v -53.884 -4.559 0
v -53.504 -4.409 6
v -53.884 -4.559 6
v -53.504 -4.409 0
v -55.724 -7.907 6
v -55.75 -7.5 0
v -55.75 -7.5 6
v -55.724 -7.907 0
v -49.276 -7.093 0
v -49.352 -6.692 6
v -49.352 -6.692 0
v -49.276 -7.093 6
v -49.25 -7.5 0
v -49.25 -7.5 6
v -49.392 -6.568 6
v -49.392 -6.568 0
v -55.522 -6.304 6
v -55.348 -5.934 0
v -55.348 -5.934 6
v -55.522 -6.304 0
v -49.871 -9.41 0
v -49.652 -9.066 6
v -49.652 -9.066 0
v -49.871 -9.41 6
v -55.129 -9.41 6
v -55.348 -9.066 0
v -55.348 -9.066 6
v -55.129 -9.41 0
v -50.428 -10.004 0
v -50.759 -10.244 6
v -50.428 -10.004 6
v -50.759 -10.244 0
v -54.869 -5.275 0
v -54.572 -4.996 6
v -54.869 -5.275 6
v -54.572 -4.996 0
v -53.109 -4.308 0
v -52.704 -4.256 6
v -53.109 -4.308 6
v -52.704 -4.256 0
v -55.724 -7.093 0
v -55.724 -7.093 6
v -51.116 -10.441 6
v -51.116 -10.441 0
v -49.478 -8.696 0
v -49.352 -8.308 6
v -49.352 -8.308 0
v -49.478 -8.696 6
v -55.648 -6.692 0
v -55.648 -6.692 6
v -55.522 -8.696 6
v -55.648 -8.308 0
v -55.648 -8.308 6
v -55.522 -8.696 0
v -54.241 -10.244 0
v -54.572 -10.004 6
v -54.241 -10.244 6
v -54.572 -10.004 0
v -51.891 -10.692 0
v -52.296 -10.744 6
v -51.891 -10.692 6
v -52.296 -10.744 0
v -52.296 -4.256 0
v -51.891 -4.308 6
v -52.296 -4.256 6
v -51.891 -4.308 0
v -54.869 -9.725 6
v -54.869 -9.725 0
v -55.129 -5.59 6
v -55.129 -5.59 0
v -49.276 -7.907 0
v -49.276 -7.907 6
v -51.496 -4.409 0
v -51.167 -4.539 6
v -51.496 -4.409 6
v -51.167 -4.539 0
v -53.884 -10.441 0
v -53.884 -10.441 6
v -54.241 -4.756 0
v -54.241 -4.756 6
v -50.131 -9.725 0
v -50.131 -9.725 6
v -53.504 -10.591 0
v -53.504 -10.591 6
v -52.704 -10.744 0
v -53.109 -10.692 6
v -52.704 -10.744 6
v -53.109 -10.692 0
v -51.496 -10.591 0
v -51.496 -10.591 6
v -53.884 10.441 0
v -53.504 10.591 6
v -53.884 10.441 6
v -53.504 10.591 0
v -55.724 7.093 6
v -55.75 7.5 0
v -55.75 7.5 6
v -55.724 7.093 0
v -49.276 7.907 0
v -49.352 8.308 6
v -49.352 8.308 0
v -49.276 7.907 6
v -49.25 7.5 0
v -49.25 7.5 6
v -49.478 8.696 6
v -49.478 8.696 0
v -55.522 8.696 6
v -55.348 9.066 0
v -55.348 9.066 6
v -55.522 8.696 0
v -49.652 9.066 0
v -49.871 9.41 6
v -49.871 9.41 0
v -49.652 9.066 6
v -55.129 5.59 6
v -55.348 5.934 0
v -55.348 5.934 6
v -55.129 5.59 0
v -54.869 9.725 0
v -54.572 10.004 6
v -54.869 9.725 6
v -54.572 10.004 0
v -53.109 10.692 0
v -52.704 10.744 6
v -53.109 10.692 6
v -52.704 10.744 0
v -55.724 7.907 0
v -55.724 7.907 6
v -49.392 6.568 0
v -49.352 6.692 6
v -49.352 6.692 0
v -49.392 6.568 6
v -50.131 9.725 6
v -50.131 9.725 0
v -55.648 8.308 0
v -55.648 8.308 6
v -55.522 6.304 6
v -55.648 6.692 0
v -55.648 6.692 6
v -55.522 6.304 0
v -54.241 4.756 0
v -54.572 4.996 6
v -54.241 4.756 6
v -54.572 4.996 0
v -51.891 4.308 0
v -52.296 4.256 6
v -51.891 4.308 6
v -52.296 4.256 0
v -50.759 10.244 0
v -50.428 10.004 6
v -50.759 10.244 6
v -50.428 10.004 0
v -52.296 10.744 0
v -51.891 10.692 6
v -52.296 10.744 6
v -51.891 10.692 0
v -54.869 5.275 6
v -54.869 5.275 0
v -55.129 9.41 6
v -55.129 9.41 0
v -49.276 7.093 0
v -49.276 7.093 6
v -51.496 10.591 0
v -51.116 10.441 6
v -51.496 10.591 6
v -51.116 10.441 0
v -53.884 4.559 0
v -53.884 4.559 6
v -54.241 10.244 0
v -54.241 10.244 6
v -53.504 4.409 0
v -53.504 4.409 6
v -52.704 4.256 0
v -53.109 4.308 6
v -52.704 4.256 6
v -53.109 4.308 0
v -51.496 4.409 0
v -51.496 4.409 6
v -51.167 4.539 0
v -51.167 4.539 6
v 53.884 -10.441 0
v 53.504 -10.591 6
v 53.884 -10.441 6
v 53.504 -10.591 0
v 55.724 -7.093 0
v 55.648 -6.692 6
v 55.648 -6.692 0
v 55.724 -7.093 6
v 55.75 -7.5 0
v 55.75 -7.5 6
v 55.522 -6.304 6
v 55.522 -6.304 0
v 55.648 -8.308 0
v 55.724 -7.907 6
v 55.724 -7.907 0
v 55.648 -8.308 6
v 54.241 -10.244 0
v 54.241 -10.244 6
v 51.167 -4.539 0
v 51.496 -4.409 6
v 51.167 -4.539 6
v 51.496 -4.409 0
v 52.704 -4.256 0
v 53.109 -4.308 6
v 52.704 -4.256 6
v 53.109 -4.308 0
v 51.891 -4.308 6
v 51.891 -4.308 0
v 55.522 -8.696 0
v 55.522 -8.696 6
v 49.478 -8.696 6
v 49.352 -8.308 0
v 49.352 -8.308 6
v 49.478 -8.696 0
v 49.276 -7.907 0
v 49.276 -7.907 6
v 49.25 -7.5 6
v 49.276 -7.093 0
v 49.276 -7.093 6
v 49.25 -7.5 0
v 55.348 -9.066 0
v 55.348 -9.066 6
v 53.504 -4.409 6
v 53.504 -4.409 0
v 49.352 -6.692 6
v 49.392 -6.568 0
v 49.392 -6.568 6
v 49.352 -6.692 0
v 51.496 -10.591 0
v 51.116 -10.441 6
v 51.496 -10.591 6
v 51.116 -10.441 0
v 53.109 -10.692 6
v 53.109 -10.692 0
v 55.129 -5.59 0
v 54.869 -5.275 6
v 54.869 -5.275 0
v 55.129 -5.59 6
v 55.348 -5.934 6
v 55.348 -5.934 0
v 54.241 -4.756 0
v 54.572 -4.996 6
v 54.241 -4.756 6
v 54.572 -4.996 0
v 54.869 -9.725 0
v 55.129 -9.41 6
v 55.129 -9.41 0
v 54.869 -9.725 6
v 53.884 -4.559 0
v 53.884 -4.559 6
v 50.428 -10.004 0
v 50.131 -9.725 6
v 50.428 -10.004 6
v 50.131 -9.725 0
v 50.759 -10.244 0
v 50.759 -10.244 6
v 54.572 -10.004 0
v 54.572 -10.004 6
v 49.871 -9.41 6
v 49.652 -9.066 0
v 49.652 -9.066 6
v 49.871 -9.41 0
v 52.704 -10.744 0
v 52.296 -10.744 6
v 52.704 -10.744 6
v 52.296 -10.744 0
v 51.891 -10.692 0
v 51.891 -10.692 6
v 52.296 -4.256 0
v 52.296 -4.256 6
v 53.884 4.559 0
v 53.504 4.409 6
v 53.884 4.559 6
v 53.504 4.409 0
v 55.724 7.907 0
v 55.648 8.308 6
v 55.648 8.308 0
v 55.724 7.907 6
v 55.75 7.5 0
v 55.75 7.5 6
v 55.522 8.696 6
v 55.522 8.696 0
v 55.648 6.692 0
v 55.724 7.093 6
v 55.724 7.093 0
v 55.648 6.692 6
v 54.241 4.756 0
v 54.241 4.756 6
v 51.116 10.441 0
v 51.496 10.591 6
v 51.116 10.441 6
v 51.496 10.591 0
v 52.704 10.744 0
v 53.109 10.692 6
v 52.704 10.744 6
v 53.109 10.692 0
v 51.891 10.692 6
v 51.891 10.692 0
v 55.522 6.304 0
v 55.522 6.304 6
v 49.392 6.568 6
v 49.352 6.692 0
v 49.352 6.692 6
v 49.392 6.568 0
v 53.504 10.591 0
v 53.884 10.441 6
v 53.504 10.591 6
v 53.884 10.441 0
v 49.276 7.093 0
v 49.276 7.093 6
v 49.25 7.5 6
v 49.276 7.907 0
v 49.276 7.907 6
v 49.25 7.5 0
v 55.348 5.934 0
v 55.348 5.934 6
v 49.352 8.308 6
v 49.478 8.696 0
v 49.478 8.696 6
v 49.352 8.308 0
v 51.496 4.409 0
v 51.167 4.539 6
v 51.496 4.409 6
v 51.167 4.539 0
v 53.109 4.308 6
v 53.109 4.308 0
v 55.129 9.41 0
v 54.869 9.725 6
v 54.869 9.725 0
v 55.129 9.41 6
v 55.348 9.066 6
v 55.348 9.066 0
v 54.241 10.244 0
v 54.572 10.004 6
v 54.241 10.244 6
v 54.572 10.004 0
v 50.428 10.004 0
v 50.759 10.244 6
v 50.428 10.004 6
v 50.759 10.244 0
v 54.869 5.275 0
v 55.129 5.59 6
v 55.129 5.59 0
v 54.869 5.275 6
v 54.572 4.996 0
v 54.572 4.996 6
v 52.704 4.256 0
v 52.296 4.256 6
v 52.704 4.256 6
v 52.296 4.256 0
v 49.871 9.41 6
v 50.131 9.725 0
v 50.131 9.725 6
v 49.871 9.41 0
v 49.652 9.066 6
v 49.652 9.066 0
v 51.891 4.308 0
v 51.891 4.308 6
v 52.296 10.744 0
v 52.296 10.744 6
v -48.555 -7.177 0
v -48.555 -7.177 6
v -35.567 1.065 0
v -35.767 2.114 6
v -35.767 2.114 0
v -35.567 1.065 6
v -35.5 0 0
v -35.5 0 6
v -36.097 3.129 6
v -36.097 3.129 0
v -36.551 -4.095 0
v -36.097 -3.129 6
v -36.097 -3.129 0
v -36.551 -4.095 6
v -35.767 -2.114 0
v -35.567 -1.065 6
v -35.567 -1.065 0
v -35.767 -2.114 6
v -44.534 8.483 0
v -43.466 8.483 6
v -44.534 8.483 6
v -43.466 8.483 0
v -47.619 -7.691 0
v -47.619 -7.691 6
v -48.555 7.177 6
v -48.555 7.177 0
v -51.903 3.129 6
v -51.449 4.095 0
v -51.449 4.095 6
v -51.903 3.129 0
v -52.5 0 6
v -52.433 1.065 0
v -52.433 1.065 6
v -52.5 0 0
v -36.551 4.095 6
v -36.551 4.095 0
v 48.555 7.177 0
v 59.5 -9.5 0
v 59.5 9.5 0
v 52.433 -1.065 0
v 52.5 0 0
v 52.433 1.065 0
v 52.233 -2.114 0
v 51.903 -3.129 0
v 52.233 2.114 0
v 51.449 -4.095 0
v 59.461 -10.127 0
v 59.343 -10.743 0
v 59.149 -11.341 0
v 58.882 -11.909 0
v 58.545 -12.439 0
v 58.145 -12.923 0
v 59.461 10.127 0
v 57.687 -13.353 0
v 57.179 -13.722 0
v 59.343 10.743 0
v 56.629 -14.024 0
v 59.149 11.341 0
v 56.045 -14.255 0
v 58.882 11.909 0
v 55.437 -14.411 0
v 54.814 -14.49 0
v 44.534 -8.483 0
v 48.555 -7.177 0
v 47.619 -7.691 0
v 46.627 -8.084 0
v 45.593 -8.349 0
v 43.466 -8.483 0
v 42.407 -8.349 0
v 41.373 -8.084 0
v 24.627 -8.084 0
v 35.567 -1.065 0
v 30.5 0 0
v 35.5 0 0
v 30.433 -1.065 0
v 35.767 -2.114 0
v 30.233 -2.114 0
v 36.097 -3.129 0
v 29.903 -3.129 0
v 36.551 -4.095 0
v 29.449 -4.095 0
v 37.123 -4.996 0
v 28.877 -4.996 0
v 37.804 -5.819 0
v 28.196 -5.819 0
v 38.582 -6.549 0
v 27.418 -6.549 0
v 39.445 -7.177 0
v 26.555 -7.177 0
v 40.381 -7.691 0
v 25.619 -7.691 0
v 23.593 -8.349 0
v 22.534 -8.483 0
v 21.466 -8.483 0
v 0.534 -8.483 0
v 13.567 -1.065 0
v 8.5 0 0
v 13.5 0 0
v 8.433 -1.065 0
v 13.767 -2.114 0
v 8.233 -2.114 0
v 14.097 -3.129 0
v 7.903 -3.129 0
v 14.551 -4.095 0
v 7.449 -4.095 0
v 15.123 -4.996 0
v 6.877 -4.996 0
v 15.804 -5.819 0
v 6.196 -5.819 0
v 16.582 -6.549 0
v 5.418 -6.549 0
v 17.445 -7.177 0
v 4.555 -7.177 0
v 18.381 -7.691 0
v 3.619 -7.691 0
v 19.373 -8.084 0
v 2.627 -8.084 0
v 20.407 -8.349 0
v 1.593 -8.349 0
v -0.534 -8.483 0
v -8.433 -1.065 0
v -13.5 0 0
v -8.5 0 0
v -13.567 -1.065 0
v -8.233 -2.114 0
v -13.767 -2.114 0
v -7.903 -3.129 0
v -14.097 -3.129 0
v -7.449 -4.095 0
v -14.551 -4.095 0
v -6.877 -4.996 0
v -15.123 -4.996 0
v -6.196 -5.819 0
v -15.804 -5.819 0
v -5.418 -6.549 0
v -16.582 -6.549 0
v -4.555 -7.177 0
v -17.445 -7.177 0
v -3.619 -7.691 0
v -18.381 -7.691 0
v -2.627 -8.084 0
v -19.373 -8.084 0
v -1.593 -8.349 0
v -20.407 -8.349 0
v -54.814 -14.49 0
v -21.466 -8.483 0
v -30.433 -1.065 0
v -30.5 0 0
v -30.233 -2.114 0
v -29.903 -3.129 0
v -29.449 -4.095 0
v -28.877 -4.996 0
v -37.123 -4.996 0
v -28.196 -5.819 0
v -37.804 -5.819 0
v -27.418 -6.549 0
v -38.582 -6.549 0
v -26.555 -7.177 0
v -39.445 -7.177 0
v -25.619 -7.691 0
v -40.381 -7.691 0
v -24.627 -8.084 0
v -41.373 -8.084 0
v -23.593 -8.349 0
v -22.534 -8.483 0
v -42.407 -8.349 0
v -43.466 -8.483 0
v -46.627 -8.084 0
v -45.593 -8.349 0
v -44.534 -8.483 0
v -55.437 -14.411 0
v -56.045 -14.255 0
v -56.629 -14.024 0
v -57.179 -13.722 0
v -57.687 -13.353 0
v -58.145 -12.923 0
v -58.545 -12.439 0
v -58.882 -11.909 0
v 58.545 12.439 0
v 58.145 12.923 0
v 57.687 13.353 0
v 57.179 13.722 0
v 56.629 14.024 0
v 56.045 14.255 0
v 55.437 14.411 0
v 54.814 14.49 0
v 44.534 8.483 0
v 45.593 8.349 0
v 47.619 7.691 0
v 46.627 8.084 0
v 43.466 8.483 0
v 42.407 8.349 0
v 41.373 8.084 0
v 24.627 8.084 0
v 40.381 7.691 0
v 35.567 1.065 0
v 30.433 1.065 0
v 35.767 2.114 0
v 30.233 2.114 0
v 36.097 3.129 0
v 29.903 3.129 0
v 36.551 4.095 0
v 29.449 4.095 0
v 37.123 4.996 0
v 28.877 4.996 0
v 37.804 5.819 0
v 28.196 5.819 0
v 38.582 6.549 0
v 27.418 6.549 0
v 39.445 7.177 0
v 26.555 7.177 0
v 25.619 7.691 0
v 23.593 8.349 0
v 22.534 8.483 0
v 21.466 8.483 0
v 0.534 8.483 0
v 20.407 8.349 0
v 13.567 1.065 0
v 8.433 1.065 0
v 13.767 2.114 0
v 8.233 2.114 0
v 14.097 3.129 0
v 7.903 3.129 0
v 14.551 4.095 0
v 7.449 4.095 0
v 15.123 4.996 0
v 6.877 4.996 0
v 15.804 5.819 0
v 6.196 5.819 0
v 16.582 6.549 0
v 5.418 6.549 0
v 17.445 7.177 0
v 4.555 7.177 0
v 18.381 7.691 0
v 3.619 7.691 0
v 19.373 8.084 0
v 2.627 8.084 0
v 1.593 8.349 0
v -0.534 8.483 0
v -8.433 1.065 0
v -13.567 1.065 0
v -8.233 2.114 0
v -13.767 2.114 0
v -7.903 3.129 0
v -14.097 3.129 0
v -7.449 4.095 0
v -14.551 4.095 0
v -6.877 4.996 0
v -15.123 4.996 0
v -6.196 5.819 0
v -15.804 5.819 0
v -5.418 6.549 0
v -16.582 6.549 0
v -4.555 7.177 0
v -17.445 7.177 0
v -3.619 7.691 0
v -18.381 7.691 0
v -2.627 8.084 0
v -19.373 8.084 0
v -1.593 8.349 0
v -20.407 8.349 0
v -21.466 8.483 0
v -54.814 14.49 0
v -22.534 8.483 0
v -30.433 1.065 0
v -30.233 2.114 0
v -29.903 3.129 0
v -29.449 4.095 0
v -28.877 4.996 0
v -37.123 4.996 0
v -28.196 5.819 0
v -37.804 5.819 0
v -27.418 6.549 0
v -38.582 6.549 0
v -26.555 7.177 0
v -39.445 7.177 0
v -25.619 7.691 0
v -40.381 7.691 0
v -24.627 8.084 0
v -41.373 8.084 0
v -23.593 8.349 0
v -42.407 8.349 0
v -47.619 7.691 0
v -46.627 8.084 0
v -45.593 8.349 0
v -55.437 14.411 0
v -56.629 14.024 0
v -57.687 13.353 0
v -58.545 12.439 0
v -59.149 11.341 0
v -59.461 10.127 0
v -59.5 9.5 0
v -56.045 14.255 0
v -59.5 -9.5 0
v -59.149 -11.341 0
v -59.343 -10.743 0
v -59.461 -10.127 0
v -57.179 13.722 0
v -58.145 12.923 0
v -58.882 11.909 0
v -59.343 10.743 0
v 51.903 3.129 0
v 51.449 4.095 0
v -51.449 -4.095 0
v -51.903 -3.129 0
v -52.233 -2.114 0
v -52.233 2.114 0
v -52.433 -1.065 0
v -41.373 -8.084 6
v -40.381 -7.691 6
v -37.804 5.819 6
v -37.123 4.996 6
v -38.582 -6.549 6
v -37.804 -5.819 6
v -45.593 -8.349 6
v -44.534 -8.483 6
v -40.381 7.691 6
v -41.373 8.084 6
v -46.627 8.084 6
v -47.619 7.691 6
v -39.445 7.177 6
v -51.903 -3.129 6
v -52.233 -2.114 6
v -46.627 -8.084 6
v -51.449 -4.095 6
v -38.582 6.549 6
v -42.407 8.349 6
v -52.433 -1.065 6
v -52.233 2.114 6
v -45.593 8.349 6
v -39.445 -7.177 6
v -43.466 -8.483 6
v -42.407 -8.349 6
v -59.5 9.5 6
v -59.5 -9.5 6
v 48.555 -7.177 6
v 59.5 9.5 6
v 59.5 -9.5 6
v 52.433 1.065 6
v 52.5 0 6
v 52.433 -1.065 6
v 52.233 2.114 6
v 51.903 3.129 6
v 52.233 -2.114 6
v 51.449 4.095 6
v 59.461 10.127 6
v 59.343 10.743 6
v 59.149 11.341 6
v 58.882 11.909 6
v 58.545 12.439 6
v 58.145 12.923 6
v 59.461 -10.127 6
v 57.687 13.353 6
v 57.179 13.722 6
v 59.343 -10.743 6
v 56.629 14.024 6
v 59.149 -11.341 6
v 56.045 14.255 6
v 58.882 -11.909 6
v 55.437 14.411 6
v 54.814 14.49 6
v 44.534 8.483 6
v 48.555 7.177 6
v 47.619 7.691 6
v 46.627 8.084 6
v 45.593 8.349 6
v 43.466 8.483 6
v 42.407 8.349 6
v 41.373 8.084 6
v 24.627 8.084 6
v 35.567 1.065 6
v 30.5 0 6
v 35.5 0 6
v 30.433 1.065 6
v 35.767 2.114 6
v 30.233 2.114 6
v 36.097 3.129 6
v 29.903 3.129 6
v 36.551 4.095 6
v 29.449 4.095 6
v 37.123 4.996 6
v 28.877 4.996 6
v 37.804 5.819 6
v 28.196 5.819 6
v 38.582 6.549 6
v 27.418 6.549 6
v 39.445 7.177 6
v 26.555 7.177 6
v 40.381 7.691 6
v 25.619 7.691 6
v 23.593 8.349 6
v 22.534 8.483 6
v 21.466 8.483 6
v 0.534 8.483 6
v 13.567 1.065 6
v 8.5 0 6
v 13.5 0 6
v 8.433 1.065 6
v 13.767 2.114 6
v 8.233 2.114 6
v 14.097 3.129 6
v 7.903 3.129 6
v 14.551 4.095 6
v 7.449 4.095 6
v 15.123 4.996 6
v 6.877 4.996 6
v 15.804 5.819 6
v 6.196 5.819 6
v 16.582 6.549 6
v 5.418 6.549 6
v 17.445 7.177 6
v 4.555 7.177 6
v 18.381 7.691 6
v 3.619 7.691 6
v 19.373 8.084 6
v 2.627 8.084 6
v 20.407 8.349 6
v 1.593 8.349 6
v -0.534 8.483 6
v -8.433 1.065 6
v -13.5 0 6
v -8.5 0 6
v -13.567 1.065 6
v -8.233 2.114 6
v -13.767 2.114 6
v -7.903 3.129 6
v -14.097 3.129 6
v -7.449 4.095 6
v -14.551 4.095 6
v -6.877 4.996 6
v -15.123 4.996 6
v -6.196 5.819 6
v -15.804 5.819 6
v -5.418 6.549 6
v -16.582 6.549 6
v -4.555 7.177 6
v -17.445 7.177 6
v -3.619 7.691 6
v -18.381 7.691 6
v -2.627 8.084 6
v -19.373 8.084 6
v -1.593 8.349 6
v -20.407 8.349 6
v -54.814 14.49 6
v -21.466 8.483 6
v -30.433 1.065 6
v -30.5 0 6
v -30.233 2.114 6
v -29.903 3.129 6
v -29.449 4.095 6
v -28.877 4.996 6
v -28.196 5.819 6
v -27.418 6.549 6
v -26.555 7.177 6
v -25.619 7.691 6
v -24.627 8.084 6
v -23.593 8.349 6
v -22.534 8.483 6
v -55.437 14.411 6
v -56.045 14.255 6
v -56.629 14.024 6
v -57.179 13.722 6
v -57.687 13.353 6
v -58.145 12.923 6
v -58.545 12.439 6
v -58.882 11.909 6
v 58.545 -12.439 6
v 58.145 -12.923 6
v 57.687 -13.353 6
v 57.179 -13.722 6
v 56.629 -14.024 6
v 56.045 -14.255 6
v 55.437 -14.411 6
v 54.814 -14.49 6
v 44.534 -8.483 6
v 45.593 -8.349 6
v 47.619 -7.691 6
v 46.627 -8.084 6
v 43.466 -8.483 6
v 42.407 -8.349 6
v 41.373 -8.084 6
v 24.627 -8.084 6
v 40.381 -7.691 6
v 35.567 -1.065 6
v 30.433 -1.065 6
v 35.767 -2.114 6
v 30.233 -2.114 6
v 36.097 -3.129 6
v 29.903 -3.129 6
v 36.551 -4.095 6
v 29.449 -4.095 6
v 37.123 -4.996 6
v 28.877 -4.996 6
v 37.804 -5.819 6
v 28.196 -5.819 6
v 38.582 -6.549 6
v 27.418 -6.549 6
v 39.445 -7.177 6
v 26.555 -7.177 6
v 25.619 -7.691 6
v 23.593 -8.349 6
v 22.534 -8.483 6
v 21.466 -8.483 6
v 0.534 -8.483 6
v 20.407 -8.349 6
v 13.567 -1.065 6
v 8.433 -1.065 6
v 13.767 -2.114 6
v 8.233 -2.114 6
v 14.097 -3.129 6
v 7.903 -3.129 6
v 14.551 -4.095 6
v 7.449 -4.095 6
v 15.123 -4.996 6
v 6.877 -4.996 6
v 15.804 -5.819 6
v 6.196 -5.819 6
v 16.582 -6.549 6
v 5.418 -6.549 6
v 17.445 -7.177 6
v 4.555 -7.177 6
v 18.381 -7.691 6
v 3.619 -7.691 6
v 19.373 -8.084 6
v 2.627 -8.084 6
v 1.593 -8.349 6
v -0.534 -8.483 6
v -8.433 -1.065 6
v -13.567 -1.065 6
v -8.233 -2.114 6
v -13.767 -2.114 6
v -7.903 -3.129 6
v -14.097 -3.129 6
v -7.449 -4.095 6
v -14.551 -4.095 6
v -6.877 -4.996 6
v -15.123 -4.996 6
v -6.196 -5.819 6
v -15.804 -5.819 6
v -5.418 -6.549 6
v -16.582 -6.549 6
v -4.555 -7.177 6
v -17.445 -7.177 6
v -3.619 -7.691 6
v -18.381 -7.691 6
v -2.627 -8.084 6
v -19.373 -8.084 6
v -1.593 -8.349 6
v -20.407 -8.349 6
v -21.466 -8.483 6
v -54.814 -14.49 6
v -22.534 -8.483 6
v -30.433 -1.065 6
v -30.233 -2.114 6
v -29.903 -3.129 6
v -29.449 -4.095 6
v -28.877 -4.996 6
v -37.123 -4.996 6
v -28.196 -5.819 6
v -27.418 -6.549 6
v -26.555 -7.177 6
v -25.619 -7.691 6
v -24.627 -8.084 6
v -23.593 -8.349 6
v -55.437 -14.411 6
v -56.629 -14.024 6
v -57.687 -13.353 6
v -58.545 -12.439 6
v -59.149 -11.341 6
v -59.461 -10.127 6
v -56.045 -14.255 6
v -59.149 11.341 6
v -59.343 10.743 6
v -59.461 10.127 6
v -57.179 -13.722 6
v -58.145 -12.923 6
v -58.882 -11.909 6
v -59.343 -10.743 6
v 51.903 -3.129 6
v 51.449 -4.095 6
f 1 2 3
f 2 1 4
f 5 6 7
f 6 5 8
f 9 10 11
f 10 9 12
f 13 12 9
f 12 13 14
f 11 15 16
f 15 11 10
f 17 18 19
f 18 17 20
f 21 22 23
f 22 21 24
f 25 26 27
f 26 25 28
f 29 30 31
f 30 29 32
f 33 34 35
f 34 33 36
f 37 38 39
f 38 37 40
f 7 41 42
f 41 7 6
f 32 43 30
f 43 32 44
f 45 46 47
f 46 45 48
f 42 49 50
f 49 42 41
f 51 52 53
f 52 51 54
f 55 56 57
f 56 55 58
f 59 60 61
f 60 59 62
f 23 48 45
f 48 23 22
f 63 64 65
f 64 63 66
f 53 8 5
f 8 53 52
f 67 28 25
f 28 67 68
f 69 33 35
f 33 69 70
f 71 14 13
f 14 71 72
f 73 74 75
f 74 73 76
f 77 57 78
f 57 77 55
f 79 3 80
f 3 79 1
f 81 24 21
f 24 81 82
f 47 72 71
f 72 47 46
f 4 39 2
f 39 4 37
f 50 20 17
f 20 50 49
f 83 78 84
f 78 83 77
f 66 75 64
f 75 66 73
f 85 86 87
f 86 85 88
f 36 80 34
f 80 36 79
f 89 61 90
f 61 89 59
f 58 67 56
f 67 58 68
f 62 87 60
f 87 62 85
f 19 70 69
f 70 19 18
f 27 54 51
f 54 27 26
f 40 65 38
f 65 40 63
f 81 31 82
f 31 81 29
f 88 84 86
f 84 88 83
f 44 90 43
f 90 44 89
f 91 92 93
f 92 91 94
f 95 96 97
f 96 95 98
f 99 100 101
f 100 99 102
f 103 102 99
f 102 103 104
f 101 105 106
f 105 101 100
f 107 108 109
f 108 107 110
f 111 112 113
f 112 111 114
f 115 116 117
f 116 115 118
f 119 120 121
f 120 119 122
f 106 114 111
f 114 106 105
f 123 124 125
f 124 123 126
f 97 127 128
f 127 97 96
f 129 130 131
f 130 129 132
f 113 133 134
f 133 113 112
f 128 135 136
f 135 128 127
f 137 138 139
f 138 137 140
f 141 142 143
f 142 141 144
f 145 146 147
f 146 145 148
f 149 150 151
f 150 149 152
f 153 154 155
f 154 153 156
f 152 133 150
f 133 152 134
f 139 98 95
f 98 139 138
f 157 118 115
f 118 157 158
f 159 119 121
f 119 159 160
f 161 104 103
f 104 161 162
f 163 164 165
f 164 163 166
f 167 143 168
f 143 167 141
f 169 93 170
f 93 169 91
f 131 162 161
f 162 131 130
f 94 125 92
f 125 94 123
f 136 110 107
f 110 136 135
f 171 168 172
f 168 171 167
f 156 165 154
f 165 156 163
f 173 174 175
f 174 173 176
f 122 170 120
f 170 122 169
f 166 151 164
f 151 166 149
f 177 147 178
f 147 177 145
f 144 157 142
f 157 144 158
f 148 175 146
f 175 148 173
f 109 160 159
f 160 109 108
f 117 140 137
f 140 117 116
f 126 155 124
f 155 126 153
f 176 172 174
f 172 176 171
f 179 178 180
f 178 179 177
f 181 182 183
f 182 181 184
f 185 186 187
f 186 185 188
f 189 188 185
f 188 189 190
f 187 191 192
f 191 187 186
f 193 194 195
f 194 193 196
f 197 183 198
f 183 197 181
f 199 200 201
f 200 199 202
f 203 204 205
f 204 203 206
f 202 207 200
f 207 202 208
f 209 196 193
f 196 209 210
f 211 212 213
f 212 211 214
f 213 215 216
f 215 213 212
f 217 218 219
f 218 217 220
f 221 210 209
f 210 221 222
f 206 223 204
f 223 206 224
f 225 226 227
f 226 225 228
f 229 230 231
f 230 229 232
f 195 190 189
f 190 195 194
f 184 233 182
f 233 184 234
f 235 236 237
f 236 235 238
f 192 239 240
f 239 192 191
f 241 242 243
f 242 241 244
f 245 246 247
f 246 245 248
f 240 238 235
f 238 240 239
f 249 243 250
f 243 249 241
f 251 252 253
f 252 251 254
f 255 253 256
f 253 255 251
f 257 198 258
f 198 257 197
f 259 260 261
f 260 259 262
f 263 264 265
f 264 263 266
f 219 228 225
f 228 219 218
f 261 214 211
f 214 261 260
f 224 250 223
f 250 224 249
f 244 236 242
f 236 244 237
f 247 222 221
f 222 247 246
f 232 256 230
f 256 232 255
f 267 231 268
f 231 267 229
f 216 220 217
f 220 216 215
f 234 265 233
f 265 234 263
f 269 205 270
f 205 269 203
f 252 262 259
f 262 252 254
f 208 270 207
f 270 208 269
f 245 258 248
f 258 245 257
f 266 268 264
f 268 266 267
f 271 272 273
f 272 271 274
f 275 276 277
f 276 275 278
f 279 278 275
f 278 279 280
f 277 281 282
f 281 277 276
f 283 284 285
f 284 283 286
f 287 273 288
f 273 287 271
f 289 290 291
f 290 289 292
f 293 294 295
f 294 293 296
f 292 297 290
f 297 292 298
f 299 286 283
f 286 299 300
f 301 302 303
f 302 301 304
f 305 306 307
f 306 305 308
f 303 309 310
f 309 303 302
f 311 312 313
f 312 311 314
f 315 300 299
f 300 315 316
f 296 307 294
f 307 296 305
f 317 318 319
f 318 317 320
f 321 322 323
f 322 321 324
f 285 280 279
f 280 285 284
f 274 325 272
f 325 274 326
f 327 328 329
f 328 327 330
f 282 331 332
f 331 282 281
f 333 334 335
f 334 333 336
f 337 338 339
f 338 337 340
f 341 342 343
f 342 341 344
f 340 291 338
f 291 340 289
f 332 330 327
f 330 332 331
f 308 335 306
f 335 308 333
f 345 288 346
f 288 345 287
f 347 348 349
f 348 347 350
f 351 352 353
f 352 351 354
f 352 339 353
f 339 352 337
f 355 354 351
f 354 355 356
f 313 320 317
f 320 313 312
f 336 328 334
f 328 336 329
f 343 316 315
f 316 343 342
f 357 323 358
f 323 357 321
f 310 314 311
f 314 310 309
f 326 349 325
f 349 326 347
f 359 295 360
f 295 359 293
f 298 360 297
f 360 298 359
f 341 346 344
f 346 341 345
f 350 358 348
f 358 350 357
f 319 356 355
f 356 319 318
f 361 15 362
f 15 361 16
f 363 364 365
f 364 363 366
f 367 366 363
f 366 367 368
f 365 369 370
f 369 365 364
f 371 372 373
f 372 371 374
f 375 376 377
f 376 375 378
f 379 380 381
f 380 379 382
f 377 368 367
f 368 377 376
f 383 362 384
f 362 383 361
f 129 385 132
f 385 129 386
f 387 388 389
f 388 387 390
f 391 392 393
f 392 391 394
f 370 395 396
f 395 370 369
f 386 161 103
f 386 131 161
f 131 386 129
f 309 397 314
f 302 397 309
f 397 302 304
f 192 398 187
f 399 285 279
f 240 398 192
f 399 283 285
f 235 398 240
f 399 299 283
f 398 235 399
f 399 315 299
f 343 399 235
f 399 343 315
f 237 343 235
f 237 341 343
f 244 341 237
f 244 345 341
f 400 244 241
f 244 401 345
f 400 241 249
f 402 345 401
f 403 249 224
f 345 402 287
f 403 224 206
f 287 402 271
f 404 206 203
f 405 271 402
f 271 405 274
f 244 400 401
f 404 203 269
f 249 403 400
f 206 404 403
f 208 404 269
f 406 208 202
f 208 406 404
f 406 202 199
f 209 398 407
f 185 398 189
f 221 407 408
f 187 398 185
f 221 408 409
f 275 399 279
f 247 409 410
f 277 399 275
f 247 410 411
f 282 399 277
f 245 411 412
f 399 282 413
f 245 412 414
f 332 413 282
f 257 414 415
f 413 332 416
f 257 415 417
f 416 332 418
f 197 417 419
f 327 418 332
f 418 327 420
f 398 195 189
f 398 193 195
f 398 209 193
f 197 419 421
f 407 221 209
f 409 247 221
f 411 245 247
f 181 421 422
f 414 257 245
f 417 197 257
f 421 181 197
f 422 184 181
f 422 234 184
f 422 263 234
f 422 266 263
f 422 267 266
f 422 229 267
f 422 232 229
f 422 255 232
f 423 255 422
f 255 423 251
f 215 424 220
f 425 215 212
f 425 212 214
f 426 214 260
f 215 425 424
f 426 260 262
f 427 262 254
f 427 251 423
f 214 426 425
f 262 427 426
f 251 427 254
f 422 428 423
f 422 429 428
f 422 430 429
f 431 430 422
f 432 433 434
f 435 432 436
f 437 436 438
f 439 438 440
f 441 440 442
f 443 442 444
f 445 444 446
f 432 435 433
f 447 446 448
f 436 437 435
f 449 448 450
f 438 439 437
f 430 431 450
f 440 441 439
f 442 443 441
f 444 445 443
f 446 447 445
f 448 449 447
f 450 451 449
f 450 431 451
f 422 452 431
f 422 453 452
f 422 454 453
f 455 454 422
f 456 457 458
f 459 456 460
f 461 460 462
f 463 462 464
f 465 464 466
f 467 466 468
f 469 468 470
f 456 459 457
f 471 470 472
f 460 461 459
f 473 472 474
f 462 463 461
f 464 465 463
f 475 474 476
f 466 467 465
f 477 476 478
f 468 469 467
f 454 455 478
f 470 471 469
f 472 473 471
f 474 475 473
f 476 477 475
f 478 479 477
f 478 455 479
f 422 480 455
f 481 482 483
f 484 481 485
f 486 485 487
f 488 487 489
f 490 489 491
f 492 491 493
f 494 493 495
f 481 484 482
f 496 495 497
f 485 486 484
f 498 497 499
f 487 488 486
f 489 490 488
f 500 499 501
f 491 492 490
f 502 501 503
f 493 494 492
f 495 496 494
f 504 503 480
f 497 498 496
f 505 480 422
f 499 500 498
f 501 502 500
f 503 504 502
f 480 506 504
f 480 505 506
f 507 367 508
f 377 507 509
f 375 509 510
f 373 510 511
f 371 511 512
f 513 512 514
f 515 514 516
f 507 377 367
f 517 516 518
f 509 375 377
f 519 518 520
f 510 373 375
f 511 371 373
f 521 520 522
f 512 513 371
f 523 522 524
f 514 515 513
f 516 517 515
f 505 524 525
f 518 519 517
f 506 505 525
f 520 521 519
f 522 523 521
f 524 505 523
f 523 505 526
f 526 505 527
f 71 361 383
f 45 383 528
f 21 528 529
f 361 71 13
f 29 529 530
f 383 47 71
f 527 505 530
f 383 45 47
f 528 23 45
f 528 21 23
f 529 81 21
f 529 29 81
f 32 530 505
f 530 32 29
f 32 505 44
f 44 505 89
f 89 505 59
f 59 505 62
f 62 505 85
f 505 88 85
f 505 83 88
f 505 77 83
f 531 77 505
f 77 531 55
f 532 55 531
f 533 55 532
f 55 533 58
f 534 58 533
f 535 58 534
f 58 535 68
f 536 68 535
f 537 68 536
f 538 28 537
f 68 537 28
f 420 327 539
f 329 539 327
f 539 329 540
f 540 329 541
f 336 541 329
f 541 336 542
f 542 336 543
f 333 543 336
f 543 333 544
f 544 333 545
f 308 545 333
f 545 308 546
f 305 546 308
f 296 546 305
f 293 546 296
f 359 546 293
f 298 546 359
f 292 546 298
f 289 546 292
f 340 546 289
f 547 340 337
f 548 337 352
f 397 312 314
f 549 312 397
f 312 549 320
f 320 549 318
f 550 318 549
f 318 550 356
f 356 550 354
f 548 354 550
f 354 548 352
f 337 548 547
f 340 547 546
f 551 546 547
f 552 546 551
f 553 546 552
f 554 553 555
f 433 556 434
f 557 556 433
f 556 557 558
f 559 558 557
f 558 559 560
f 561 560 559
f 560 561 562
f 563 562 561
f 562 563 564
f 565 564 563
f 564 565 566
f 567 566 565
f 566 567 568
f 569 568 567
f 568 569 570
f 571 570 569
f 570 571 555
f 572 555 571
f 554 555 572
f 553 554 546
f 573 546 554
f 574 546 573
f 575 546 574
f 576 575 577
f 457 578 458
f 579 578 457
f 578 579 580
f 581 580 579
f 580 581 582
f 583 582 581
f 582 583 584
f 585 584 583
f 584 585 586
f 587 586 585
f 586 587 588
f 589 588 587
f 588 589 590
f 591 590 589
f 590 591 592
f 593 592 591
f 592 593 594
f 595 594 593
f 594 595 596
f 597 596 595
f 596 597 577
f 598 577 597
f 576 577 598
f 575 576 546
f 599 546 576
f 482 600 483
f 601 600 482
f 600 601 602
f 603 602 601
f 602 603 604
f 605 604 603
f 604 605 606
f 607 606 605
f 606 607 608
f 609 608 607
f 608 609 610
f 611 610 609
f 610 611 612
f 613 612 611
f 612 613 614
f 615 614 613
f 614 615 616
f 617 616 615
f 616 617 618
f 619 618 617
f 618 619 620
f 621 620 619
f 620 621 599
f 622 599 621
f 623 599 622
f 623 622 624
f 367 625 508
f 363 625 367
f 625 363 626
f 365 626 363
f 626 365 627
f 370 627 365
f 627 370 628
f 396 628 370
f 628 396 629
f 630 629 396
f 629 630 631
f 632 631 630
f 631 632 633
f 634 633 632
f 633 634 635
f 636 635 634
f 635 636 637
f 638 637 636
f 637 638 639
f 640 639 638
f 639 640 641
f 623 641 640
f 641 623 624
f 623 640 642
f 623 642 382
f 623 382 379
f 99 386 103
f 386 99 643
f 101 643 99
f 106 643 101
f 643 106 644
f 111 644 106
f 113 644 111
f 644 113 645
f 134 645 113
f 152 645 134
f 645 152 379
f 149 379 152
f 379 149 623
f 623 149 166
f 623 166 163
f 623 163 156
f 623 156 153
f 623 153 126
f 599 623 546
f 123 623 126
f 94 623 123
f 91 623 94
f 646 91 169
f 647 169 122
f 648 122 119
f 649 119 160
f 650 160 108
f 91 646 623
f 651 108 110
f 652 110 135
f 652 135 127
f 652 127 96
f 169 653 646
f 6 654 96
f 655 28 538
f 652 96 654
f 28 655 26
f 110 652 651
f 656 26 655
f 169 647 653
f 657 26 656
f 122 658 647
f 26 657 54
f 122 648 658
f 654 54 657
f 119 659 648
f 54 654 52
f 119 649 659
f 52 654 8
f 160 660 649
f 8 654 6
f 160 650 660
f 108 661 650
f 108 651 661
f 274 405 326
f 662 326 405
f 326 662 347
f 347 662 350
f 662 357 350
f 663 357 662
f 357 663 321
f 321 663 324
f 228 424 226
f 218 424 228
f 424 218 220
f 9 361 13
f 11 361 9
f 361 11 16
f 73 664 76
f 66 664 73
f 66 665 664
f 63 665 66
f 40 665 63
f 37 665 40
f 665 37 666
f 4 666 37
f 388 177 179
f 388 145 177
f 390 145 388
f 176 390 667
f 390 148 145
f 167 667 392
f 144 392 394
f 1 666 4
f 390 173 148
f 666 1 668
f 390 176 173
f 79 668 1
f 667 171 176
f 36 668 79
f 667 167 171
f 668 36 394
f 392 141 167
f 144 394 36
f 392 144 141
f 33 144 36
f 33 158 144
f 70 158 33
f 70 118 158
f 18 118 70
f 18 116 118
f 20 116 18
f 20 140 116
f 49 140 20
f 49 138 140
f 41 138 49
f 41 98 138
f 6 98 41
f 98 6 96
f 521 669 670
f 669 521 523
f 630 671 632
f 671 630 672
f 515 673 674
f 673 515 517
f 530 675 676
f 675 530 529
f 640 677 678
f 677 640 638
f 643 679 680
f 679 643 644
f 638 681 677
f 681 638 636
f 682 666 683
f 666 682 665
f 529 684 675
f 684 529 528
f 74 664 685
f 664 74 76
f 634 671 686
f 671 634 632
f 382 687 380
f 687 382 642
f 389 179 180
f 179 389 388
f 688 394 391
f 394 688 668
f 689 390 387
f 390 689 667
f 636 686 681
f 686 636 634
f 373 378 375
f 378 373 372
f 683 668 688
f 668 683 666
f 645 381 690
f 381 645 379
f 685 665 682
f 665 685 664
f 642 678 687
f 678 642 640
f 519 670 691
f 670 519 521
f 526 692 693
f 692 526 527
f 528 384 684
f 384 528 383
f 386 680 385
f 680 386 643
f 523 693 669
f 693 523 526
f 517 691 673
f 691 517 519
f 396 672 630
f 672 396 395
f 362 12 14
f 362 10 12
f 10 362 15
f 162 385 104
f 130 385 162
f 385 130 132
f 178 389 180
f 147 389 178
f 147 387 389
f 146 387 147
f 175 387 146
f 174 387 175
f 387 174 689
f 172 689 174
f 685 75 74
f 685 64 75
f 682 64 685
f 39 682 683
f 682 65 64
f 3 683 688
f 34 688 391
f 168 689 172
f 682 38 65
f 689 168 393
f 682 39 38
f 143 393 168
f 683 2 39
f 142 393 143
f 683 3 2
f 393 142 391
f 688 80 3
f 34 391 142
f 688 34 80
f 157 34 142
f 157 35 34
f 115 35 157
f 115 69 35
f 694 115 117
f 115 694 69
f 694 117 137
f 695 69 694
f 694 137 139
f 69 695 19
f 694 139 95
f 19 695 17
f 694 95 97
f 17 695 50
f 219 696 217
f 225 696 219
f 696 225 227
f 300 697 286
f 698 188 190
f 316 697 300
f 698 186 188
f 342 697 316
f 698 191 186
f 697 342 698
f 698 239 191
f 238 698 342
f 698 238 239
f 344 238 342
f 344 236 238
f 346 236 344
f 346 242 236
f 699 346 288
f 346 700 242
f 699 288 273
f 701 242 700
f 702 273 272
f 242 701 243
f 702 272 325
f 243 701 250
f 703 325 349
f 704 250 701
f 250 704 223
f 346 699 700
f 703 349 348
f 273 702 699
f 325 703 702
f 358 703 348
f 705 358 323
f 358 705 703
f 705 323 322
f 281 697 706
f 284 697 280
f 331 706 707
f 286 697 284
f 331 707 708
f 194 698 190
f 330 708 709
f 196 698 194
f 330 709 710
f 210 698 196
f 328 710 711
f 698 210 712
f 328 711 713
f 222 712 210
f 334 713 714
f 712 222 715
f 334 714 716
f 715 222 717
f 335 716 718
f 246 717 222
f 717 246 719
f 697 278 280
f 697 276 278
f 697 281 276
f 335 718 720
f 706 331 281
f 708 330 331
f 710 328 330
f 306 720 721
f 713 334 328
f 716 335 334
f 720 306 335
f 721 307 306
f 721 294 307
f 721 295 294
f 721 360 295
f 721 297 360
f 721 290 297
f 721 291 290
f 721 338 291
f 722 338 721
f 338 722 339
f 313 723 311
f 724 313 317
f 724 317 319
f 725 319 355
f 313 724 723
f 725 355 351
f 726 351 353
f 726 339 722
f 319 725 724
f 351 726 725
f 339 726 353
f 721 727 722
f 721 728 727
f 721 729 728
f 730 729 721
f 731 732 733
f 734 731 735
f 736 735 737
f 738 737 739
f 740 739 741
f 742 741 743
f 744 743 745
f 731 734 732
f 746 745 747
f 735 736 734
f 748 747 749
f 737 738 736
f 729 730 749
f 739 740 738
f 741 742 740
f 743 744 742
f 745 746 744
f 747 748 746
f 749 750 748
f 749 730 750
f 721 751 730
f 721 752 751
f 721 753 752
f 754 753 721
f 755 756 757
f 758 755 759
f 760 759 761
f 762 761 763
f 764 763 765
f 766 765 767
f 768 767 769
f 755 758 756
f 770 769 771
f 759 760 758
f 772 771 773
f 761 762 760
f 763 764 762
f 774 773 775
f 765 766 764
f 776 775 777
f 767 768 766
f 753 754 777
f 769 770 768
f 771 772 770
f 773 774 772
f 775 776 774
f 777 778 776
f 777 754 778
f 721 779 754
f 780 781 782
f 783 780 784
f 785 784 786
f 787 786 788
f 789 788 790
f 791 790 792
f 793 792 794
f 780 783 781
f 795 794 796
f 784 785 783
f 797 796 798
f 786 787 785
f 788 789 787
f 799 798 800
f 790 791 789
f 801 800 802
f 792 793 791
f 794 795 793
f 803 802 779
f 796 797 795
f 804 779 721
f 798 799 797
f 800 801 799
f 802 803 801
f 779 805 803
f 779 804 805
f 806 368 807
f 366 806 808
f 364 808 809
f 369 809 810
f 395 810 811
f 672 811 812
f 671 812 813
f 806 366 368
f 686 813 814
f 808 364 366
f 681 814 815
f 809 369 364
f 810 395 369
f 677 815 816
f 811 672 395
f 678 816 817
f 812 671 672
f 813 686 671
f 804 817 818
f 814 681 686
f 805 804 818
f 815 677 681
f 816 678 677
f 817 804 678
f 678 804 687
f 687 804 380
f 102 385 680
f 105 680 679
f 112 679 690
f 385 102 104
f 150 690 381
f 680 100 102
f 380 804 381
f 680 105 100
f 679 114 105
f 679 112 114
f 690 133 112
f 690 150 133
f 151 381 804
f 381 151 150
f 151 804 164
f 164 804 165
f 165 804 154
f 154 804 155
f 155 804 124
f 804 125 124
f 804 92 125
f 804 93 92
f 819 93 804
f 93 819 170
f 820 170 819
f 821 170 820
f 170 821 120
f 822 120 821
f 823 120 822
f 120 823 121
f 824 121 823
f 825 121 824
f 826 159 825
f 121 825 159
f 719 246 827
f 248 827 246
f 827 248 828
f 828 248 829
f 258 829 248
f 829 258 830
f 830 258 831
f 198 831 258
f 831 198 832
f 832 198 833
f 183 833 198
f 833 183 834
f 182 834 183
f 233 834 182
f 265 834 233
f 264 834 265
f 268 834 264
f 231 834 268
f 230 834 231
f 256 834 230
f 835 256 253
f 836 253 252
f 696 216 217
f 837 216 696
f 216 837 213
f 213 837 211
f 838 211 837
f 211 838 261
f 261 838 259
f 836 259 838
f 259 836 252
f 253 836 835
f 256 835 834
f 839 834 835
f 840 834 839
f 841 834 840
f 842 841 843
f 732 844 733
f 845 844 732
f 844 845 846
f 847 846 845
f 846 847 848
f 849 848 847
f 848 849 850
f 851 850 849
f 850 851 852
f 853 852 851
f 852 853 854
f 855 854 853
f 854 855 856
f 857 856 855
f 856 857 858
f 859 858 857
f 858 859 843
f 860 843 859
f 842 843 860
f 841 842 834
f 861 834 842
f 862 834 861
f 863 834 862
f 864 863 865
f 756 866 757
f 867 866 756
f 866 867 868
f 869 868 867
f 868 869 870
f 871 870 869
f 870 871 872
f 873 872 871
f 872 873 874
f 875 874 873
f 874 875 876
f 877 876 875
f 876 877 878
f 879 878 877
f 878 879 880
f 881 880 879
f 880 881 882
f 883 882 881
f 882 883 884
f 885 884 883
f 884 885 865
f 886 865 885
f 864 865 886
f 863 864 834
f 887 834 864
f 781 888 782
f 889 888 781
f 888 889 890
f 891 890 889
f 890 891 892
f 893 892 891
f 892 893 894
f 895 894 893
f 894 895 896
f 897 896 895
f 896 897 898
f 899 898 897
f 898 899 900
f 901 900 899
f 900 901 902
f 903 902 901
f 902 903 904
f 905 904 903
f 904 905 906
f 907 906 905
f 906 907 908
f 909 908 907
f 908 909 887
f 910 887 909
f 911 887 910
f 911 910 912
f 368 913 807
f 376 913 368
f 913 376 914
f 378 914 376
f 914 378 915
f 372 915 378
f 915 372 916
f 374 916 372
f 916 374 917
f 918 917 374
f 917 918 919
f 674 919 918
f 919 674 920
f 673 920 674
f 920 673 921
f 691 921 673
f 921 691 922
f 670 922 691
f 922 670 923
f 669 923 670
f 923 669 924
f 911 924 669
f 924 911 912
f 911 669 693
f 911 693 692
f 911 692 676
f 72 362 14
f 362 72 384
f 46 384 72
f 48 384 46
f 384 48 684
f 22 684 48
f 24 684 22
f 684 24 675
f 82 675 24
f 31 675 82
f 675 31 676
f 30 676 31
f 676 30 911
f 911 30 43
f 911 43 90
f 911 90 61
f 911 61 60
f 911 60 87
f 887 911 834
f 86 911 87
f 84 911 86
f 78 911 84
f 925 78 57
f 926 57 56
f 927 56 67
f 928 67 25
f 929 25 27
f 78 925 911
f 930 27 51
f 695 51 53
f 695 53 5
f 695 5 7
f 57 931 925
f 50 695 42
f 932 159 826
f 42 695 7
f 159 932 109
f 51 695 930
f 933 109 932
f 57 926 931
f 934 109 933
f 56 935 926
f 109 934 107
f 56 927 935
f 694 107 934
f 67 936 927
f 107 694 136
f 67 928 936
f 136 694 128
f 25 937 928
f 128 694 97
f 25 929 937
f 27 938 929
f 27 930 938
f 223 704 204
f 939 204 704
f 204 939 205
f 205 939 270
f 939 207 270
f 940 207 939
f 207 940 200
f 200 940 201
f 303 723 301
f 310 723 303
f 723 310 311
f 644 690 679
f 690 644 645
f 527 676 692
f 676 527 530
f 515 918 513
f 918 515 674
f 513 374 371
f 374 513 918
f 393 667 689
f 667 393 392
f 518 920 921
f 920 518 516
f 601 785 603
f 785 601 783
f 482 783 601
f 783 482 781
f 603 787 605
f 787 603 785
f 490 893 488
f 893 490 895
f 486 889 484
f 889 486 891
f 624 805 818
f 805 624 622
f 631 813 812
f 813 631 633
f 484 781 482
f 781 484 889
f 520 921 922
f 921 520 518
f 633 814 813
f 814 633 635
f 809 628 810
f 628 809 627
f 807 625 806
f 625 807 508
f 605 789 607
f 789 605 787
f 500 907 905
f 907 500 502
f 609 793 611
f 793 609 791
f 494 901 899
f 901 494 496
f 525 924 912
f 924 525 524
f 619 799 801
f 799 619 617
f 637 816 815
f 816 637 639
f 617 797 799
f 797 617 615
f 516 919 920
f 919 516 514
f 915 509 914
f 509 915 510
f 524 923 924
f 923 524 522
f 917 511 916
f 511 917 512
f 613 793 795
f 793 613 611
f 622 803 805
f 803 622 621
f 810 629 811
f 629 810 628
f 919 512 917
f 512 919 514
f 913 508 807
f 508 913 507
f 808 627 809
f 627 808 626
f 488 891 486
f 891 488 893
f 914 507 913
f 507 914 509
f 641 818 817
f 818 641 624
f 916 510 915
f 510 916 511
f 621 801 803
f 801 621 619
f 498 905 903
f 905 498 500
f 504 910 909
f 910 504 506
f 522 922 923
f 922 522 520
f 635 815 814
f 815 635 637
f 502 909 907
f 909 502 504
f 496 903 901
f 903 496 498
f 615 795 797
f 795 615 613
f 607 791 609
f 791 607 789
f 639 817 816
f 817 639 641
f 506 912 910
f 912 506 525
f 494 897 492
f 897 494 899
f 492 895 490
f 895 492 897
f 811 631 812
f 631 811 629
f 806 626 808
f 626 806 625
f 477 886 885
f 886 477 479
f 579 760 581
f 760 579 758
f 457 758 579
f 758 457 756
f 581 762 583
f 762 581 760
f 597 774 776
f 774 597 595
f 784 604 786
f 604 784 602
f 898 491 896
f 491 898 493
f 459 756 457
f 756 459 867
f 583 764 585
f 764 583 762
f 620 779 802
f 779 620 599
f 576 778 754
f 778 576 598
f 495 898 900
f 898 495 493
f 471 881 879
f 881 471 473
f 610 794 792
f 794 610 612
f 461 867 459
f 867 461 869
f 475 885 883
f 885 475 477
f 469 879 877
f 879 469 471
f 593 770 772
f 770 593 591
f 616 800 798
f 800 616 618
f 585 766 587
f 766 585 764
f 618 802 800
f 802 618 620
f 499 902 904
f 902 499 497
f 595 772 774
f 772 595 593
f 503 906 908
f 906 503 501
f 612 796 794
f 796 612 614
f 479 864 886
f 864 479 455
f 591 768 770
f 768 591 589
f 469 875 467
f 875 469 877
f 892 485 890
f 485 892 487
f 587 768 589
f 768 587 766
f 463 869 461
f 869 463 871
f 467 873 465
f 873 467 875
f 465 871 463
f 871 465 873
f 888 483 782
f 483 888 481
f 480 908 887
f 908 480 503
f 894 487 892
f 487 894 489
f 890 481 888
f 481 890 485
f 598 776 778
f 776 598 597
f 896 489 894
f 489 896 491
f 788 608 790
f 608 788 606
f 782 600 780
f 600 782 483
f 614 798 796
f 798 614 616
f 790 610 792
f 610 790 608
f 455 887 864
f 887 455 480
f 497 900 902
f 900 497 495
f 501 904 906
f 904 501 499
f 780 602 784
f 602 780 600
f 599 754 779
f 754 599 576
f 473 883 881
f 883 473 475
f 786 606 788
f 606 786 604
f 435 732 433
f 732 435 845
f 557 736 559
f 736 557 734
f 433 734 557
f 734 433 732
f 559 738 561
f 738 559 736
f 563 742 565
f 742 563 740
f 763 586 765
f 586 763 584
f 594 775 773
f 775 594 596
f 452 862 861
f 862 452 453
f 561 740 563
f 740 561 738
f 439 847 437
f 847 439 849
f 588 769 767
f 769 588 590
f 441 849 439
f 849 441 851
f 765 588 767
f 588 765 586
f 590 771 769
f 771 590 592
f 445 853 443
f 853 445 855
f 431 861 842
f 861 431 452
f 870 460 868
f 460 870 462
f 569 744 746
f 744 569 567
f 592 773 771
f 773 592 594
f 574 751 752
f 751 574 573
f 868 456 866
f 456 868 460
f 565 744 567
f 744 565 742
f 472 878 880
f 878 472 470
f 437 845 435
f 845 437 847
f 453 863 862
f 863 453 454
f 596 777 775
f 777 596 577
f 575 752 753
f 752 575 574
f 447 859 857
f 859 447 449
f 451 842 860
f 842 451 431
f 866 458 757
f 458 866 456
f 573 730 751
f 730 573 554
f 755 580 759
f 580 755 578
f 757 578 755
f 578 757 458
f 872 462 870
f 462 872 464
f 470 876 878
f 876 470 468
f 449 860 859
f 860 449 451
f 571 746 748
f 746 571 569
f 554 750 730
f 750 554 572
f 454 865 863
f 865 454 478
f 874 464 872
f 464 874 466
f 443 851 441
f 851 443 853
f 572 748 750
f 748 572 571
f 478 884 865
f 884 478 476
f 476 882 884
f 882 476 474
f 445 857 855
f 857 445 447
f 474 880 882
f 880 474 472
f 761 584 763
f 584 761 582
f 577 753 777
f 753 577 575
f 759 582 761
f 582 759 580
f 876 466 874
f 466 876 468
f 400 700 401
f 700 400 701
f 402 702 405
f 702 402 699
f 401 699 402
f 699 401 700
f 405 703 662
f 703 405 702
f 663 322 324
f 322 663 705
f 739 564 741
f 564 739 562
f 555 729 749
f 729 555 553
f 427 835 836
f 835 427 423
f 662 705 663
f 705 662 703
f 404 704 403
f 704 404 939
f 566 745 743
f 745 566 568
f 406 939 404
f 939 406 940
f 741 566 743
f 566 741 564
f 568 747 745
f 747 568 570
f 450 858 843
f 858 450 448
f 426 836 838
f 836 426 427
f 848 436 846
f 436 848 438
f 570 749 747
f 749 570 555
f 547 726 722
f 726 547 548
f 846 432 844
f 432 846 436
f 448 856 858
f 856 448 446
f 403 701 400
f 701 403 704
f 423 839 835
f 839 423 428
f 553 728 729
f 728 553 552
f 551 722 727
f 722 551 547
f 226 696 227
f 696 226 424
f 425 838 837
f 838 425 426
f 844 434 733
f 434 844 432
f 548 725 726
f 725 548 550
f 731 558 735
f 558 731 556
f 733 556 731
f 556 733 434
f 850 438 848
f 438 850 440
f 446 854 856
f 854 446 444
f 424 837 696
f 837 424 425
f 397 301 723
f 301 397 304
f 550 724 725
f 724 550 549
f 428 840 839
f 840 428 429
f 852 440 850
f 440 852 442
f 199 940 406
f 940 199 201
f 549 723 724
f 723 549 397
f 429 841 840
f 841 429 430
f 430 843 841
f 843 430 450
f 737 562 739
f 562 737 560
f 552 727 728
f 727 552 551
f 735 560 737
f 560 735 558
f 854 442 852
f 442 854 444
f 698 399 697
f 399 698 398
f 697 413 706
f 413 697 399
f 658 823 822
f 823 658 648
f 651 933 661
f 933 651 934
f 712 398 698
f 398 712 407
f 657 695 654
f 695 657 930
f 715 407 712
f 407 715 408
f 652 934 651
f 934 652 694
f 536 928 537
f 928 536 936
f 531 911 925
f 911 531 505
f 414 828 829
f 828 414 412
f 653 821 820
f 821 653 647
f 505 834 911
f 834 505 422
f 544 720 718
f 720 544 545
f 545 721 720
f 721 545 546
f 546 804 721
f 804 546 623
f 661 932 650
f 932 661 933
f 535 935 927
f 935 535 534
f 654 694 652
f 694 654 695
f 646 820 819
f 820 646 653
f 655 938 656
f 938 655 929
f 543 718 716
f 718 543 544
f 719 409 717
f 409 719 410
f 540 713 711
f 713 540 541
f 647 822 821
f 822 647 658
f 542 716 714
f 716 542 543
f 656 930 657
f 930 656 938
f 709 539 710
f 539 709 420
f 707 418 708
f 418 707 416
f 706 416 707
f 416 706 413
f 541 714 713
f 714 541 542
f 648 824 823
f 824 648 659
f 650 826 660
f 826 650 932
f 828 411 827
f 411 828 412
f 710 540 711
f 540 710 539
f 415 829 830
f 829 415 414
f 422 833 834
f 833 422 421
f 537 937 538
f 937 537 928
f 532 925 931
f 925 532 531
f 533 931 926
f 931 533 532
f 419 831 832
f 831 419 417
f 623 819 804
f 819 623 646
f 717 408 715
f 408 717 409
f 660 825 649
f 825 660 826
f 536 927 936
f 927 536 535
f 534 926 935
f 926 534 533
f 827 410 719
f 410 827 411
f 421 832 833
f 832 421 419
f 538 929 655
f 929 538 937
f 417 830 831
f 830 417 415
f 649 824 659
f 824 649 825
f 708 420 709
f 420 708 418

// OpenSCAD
$fn = 50;


difference() {
	union() {
		hull() {
			translate(v = [-54.5000000000, 9.5000000000, 0]) {
				cylinder(h = 6, r = 5);
			}
			translate(v = [54.5000000000, 9.5000000000, 0]) {
				cylinder(h = 6, r = 5);
			}
			translate(v = [-54.5000000000, -9.5000000000, 0]) {
				cylinder(h = 6, r = 5);
			}
			translate(v = [54.5000000000, -9.5000000000, 0]) {
				cylinder(h = 6, r = 5);
			}
		}
	}
	union() {
		#translate(v = [-52.5000000000, -7.5000000000, -100.0000000000]) {
			cylinder(h = 200, r = 3.2500000000);
		}
		#translate(v = [-52.5000000000, 7.5000000000, -100.0000000000]) {
			cylinder(h = 200, r = 3.2500000000);
		}
		#translate(v = [52.5000000000, -7.5000000000, -100.0000000000]) {
			cylinder(h = 200, r = 3.2500000000);
		}
		#translate(v = [52.5000000000, 7.5000000000, -100.0000000000]) {
			cylinder(h = 200, r = 3.2500000000);
		}
		#translate(v = [-44.0000000000, 0, 0]) {
			cylinder(h = 6, r = 8.5000000000);
		}
		#translate(v = [-22.0000000000, 0, 0]) {
			cylinder(h = 6, r = 8.5000000000);
		}
		#cylinder(h = 6, r = 8.5000000000);
		#translate(v = [22.0000000000, 0, 0]) {
			cylinder(h = 6, r = 8.5000000000);
		}
		#translate(v = [44.0000000000, 0, 0]) {
			cylinder(h = 6, r = 8.5000000000);
		}
	}
}
